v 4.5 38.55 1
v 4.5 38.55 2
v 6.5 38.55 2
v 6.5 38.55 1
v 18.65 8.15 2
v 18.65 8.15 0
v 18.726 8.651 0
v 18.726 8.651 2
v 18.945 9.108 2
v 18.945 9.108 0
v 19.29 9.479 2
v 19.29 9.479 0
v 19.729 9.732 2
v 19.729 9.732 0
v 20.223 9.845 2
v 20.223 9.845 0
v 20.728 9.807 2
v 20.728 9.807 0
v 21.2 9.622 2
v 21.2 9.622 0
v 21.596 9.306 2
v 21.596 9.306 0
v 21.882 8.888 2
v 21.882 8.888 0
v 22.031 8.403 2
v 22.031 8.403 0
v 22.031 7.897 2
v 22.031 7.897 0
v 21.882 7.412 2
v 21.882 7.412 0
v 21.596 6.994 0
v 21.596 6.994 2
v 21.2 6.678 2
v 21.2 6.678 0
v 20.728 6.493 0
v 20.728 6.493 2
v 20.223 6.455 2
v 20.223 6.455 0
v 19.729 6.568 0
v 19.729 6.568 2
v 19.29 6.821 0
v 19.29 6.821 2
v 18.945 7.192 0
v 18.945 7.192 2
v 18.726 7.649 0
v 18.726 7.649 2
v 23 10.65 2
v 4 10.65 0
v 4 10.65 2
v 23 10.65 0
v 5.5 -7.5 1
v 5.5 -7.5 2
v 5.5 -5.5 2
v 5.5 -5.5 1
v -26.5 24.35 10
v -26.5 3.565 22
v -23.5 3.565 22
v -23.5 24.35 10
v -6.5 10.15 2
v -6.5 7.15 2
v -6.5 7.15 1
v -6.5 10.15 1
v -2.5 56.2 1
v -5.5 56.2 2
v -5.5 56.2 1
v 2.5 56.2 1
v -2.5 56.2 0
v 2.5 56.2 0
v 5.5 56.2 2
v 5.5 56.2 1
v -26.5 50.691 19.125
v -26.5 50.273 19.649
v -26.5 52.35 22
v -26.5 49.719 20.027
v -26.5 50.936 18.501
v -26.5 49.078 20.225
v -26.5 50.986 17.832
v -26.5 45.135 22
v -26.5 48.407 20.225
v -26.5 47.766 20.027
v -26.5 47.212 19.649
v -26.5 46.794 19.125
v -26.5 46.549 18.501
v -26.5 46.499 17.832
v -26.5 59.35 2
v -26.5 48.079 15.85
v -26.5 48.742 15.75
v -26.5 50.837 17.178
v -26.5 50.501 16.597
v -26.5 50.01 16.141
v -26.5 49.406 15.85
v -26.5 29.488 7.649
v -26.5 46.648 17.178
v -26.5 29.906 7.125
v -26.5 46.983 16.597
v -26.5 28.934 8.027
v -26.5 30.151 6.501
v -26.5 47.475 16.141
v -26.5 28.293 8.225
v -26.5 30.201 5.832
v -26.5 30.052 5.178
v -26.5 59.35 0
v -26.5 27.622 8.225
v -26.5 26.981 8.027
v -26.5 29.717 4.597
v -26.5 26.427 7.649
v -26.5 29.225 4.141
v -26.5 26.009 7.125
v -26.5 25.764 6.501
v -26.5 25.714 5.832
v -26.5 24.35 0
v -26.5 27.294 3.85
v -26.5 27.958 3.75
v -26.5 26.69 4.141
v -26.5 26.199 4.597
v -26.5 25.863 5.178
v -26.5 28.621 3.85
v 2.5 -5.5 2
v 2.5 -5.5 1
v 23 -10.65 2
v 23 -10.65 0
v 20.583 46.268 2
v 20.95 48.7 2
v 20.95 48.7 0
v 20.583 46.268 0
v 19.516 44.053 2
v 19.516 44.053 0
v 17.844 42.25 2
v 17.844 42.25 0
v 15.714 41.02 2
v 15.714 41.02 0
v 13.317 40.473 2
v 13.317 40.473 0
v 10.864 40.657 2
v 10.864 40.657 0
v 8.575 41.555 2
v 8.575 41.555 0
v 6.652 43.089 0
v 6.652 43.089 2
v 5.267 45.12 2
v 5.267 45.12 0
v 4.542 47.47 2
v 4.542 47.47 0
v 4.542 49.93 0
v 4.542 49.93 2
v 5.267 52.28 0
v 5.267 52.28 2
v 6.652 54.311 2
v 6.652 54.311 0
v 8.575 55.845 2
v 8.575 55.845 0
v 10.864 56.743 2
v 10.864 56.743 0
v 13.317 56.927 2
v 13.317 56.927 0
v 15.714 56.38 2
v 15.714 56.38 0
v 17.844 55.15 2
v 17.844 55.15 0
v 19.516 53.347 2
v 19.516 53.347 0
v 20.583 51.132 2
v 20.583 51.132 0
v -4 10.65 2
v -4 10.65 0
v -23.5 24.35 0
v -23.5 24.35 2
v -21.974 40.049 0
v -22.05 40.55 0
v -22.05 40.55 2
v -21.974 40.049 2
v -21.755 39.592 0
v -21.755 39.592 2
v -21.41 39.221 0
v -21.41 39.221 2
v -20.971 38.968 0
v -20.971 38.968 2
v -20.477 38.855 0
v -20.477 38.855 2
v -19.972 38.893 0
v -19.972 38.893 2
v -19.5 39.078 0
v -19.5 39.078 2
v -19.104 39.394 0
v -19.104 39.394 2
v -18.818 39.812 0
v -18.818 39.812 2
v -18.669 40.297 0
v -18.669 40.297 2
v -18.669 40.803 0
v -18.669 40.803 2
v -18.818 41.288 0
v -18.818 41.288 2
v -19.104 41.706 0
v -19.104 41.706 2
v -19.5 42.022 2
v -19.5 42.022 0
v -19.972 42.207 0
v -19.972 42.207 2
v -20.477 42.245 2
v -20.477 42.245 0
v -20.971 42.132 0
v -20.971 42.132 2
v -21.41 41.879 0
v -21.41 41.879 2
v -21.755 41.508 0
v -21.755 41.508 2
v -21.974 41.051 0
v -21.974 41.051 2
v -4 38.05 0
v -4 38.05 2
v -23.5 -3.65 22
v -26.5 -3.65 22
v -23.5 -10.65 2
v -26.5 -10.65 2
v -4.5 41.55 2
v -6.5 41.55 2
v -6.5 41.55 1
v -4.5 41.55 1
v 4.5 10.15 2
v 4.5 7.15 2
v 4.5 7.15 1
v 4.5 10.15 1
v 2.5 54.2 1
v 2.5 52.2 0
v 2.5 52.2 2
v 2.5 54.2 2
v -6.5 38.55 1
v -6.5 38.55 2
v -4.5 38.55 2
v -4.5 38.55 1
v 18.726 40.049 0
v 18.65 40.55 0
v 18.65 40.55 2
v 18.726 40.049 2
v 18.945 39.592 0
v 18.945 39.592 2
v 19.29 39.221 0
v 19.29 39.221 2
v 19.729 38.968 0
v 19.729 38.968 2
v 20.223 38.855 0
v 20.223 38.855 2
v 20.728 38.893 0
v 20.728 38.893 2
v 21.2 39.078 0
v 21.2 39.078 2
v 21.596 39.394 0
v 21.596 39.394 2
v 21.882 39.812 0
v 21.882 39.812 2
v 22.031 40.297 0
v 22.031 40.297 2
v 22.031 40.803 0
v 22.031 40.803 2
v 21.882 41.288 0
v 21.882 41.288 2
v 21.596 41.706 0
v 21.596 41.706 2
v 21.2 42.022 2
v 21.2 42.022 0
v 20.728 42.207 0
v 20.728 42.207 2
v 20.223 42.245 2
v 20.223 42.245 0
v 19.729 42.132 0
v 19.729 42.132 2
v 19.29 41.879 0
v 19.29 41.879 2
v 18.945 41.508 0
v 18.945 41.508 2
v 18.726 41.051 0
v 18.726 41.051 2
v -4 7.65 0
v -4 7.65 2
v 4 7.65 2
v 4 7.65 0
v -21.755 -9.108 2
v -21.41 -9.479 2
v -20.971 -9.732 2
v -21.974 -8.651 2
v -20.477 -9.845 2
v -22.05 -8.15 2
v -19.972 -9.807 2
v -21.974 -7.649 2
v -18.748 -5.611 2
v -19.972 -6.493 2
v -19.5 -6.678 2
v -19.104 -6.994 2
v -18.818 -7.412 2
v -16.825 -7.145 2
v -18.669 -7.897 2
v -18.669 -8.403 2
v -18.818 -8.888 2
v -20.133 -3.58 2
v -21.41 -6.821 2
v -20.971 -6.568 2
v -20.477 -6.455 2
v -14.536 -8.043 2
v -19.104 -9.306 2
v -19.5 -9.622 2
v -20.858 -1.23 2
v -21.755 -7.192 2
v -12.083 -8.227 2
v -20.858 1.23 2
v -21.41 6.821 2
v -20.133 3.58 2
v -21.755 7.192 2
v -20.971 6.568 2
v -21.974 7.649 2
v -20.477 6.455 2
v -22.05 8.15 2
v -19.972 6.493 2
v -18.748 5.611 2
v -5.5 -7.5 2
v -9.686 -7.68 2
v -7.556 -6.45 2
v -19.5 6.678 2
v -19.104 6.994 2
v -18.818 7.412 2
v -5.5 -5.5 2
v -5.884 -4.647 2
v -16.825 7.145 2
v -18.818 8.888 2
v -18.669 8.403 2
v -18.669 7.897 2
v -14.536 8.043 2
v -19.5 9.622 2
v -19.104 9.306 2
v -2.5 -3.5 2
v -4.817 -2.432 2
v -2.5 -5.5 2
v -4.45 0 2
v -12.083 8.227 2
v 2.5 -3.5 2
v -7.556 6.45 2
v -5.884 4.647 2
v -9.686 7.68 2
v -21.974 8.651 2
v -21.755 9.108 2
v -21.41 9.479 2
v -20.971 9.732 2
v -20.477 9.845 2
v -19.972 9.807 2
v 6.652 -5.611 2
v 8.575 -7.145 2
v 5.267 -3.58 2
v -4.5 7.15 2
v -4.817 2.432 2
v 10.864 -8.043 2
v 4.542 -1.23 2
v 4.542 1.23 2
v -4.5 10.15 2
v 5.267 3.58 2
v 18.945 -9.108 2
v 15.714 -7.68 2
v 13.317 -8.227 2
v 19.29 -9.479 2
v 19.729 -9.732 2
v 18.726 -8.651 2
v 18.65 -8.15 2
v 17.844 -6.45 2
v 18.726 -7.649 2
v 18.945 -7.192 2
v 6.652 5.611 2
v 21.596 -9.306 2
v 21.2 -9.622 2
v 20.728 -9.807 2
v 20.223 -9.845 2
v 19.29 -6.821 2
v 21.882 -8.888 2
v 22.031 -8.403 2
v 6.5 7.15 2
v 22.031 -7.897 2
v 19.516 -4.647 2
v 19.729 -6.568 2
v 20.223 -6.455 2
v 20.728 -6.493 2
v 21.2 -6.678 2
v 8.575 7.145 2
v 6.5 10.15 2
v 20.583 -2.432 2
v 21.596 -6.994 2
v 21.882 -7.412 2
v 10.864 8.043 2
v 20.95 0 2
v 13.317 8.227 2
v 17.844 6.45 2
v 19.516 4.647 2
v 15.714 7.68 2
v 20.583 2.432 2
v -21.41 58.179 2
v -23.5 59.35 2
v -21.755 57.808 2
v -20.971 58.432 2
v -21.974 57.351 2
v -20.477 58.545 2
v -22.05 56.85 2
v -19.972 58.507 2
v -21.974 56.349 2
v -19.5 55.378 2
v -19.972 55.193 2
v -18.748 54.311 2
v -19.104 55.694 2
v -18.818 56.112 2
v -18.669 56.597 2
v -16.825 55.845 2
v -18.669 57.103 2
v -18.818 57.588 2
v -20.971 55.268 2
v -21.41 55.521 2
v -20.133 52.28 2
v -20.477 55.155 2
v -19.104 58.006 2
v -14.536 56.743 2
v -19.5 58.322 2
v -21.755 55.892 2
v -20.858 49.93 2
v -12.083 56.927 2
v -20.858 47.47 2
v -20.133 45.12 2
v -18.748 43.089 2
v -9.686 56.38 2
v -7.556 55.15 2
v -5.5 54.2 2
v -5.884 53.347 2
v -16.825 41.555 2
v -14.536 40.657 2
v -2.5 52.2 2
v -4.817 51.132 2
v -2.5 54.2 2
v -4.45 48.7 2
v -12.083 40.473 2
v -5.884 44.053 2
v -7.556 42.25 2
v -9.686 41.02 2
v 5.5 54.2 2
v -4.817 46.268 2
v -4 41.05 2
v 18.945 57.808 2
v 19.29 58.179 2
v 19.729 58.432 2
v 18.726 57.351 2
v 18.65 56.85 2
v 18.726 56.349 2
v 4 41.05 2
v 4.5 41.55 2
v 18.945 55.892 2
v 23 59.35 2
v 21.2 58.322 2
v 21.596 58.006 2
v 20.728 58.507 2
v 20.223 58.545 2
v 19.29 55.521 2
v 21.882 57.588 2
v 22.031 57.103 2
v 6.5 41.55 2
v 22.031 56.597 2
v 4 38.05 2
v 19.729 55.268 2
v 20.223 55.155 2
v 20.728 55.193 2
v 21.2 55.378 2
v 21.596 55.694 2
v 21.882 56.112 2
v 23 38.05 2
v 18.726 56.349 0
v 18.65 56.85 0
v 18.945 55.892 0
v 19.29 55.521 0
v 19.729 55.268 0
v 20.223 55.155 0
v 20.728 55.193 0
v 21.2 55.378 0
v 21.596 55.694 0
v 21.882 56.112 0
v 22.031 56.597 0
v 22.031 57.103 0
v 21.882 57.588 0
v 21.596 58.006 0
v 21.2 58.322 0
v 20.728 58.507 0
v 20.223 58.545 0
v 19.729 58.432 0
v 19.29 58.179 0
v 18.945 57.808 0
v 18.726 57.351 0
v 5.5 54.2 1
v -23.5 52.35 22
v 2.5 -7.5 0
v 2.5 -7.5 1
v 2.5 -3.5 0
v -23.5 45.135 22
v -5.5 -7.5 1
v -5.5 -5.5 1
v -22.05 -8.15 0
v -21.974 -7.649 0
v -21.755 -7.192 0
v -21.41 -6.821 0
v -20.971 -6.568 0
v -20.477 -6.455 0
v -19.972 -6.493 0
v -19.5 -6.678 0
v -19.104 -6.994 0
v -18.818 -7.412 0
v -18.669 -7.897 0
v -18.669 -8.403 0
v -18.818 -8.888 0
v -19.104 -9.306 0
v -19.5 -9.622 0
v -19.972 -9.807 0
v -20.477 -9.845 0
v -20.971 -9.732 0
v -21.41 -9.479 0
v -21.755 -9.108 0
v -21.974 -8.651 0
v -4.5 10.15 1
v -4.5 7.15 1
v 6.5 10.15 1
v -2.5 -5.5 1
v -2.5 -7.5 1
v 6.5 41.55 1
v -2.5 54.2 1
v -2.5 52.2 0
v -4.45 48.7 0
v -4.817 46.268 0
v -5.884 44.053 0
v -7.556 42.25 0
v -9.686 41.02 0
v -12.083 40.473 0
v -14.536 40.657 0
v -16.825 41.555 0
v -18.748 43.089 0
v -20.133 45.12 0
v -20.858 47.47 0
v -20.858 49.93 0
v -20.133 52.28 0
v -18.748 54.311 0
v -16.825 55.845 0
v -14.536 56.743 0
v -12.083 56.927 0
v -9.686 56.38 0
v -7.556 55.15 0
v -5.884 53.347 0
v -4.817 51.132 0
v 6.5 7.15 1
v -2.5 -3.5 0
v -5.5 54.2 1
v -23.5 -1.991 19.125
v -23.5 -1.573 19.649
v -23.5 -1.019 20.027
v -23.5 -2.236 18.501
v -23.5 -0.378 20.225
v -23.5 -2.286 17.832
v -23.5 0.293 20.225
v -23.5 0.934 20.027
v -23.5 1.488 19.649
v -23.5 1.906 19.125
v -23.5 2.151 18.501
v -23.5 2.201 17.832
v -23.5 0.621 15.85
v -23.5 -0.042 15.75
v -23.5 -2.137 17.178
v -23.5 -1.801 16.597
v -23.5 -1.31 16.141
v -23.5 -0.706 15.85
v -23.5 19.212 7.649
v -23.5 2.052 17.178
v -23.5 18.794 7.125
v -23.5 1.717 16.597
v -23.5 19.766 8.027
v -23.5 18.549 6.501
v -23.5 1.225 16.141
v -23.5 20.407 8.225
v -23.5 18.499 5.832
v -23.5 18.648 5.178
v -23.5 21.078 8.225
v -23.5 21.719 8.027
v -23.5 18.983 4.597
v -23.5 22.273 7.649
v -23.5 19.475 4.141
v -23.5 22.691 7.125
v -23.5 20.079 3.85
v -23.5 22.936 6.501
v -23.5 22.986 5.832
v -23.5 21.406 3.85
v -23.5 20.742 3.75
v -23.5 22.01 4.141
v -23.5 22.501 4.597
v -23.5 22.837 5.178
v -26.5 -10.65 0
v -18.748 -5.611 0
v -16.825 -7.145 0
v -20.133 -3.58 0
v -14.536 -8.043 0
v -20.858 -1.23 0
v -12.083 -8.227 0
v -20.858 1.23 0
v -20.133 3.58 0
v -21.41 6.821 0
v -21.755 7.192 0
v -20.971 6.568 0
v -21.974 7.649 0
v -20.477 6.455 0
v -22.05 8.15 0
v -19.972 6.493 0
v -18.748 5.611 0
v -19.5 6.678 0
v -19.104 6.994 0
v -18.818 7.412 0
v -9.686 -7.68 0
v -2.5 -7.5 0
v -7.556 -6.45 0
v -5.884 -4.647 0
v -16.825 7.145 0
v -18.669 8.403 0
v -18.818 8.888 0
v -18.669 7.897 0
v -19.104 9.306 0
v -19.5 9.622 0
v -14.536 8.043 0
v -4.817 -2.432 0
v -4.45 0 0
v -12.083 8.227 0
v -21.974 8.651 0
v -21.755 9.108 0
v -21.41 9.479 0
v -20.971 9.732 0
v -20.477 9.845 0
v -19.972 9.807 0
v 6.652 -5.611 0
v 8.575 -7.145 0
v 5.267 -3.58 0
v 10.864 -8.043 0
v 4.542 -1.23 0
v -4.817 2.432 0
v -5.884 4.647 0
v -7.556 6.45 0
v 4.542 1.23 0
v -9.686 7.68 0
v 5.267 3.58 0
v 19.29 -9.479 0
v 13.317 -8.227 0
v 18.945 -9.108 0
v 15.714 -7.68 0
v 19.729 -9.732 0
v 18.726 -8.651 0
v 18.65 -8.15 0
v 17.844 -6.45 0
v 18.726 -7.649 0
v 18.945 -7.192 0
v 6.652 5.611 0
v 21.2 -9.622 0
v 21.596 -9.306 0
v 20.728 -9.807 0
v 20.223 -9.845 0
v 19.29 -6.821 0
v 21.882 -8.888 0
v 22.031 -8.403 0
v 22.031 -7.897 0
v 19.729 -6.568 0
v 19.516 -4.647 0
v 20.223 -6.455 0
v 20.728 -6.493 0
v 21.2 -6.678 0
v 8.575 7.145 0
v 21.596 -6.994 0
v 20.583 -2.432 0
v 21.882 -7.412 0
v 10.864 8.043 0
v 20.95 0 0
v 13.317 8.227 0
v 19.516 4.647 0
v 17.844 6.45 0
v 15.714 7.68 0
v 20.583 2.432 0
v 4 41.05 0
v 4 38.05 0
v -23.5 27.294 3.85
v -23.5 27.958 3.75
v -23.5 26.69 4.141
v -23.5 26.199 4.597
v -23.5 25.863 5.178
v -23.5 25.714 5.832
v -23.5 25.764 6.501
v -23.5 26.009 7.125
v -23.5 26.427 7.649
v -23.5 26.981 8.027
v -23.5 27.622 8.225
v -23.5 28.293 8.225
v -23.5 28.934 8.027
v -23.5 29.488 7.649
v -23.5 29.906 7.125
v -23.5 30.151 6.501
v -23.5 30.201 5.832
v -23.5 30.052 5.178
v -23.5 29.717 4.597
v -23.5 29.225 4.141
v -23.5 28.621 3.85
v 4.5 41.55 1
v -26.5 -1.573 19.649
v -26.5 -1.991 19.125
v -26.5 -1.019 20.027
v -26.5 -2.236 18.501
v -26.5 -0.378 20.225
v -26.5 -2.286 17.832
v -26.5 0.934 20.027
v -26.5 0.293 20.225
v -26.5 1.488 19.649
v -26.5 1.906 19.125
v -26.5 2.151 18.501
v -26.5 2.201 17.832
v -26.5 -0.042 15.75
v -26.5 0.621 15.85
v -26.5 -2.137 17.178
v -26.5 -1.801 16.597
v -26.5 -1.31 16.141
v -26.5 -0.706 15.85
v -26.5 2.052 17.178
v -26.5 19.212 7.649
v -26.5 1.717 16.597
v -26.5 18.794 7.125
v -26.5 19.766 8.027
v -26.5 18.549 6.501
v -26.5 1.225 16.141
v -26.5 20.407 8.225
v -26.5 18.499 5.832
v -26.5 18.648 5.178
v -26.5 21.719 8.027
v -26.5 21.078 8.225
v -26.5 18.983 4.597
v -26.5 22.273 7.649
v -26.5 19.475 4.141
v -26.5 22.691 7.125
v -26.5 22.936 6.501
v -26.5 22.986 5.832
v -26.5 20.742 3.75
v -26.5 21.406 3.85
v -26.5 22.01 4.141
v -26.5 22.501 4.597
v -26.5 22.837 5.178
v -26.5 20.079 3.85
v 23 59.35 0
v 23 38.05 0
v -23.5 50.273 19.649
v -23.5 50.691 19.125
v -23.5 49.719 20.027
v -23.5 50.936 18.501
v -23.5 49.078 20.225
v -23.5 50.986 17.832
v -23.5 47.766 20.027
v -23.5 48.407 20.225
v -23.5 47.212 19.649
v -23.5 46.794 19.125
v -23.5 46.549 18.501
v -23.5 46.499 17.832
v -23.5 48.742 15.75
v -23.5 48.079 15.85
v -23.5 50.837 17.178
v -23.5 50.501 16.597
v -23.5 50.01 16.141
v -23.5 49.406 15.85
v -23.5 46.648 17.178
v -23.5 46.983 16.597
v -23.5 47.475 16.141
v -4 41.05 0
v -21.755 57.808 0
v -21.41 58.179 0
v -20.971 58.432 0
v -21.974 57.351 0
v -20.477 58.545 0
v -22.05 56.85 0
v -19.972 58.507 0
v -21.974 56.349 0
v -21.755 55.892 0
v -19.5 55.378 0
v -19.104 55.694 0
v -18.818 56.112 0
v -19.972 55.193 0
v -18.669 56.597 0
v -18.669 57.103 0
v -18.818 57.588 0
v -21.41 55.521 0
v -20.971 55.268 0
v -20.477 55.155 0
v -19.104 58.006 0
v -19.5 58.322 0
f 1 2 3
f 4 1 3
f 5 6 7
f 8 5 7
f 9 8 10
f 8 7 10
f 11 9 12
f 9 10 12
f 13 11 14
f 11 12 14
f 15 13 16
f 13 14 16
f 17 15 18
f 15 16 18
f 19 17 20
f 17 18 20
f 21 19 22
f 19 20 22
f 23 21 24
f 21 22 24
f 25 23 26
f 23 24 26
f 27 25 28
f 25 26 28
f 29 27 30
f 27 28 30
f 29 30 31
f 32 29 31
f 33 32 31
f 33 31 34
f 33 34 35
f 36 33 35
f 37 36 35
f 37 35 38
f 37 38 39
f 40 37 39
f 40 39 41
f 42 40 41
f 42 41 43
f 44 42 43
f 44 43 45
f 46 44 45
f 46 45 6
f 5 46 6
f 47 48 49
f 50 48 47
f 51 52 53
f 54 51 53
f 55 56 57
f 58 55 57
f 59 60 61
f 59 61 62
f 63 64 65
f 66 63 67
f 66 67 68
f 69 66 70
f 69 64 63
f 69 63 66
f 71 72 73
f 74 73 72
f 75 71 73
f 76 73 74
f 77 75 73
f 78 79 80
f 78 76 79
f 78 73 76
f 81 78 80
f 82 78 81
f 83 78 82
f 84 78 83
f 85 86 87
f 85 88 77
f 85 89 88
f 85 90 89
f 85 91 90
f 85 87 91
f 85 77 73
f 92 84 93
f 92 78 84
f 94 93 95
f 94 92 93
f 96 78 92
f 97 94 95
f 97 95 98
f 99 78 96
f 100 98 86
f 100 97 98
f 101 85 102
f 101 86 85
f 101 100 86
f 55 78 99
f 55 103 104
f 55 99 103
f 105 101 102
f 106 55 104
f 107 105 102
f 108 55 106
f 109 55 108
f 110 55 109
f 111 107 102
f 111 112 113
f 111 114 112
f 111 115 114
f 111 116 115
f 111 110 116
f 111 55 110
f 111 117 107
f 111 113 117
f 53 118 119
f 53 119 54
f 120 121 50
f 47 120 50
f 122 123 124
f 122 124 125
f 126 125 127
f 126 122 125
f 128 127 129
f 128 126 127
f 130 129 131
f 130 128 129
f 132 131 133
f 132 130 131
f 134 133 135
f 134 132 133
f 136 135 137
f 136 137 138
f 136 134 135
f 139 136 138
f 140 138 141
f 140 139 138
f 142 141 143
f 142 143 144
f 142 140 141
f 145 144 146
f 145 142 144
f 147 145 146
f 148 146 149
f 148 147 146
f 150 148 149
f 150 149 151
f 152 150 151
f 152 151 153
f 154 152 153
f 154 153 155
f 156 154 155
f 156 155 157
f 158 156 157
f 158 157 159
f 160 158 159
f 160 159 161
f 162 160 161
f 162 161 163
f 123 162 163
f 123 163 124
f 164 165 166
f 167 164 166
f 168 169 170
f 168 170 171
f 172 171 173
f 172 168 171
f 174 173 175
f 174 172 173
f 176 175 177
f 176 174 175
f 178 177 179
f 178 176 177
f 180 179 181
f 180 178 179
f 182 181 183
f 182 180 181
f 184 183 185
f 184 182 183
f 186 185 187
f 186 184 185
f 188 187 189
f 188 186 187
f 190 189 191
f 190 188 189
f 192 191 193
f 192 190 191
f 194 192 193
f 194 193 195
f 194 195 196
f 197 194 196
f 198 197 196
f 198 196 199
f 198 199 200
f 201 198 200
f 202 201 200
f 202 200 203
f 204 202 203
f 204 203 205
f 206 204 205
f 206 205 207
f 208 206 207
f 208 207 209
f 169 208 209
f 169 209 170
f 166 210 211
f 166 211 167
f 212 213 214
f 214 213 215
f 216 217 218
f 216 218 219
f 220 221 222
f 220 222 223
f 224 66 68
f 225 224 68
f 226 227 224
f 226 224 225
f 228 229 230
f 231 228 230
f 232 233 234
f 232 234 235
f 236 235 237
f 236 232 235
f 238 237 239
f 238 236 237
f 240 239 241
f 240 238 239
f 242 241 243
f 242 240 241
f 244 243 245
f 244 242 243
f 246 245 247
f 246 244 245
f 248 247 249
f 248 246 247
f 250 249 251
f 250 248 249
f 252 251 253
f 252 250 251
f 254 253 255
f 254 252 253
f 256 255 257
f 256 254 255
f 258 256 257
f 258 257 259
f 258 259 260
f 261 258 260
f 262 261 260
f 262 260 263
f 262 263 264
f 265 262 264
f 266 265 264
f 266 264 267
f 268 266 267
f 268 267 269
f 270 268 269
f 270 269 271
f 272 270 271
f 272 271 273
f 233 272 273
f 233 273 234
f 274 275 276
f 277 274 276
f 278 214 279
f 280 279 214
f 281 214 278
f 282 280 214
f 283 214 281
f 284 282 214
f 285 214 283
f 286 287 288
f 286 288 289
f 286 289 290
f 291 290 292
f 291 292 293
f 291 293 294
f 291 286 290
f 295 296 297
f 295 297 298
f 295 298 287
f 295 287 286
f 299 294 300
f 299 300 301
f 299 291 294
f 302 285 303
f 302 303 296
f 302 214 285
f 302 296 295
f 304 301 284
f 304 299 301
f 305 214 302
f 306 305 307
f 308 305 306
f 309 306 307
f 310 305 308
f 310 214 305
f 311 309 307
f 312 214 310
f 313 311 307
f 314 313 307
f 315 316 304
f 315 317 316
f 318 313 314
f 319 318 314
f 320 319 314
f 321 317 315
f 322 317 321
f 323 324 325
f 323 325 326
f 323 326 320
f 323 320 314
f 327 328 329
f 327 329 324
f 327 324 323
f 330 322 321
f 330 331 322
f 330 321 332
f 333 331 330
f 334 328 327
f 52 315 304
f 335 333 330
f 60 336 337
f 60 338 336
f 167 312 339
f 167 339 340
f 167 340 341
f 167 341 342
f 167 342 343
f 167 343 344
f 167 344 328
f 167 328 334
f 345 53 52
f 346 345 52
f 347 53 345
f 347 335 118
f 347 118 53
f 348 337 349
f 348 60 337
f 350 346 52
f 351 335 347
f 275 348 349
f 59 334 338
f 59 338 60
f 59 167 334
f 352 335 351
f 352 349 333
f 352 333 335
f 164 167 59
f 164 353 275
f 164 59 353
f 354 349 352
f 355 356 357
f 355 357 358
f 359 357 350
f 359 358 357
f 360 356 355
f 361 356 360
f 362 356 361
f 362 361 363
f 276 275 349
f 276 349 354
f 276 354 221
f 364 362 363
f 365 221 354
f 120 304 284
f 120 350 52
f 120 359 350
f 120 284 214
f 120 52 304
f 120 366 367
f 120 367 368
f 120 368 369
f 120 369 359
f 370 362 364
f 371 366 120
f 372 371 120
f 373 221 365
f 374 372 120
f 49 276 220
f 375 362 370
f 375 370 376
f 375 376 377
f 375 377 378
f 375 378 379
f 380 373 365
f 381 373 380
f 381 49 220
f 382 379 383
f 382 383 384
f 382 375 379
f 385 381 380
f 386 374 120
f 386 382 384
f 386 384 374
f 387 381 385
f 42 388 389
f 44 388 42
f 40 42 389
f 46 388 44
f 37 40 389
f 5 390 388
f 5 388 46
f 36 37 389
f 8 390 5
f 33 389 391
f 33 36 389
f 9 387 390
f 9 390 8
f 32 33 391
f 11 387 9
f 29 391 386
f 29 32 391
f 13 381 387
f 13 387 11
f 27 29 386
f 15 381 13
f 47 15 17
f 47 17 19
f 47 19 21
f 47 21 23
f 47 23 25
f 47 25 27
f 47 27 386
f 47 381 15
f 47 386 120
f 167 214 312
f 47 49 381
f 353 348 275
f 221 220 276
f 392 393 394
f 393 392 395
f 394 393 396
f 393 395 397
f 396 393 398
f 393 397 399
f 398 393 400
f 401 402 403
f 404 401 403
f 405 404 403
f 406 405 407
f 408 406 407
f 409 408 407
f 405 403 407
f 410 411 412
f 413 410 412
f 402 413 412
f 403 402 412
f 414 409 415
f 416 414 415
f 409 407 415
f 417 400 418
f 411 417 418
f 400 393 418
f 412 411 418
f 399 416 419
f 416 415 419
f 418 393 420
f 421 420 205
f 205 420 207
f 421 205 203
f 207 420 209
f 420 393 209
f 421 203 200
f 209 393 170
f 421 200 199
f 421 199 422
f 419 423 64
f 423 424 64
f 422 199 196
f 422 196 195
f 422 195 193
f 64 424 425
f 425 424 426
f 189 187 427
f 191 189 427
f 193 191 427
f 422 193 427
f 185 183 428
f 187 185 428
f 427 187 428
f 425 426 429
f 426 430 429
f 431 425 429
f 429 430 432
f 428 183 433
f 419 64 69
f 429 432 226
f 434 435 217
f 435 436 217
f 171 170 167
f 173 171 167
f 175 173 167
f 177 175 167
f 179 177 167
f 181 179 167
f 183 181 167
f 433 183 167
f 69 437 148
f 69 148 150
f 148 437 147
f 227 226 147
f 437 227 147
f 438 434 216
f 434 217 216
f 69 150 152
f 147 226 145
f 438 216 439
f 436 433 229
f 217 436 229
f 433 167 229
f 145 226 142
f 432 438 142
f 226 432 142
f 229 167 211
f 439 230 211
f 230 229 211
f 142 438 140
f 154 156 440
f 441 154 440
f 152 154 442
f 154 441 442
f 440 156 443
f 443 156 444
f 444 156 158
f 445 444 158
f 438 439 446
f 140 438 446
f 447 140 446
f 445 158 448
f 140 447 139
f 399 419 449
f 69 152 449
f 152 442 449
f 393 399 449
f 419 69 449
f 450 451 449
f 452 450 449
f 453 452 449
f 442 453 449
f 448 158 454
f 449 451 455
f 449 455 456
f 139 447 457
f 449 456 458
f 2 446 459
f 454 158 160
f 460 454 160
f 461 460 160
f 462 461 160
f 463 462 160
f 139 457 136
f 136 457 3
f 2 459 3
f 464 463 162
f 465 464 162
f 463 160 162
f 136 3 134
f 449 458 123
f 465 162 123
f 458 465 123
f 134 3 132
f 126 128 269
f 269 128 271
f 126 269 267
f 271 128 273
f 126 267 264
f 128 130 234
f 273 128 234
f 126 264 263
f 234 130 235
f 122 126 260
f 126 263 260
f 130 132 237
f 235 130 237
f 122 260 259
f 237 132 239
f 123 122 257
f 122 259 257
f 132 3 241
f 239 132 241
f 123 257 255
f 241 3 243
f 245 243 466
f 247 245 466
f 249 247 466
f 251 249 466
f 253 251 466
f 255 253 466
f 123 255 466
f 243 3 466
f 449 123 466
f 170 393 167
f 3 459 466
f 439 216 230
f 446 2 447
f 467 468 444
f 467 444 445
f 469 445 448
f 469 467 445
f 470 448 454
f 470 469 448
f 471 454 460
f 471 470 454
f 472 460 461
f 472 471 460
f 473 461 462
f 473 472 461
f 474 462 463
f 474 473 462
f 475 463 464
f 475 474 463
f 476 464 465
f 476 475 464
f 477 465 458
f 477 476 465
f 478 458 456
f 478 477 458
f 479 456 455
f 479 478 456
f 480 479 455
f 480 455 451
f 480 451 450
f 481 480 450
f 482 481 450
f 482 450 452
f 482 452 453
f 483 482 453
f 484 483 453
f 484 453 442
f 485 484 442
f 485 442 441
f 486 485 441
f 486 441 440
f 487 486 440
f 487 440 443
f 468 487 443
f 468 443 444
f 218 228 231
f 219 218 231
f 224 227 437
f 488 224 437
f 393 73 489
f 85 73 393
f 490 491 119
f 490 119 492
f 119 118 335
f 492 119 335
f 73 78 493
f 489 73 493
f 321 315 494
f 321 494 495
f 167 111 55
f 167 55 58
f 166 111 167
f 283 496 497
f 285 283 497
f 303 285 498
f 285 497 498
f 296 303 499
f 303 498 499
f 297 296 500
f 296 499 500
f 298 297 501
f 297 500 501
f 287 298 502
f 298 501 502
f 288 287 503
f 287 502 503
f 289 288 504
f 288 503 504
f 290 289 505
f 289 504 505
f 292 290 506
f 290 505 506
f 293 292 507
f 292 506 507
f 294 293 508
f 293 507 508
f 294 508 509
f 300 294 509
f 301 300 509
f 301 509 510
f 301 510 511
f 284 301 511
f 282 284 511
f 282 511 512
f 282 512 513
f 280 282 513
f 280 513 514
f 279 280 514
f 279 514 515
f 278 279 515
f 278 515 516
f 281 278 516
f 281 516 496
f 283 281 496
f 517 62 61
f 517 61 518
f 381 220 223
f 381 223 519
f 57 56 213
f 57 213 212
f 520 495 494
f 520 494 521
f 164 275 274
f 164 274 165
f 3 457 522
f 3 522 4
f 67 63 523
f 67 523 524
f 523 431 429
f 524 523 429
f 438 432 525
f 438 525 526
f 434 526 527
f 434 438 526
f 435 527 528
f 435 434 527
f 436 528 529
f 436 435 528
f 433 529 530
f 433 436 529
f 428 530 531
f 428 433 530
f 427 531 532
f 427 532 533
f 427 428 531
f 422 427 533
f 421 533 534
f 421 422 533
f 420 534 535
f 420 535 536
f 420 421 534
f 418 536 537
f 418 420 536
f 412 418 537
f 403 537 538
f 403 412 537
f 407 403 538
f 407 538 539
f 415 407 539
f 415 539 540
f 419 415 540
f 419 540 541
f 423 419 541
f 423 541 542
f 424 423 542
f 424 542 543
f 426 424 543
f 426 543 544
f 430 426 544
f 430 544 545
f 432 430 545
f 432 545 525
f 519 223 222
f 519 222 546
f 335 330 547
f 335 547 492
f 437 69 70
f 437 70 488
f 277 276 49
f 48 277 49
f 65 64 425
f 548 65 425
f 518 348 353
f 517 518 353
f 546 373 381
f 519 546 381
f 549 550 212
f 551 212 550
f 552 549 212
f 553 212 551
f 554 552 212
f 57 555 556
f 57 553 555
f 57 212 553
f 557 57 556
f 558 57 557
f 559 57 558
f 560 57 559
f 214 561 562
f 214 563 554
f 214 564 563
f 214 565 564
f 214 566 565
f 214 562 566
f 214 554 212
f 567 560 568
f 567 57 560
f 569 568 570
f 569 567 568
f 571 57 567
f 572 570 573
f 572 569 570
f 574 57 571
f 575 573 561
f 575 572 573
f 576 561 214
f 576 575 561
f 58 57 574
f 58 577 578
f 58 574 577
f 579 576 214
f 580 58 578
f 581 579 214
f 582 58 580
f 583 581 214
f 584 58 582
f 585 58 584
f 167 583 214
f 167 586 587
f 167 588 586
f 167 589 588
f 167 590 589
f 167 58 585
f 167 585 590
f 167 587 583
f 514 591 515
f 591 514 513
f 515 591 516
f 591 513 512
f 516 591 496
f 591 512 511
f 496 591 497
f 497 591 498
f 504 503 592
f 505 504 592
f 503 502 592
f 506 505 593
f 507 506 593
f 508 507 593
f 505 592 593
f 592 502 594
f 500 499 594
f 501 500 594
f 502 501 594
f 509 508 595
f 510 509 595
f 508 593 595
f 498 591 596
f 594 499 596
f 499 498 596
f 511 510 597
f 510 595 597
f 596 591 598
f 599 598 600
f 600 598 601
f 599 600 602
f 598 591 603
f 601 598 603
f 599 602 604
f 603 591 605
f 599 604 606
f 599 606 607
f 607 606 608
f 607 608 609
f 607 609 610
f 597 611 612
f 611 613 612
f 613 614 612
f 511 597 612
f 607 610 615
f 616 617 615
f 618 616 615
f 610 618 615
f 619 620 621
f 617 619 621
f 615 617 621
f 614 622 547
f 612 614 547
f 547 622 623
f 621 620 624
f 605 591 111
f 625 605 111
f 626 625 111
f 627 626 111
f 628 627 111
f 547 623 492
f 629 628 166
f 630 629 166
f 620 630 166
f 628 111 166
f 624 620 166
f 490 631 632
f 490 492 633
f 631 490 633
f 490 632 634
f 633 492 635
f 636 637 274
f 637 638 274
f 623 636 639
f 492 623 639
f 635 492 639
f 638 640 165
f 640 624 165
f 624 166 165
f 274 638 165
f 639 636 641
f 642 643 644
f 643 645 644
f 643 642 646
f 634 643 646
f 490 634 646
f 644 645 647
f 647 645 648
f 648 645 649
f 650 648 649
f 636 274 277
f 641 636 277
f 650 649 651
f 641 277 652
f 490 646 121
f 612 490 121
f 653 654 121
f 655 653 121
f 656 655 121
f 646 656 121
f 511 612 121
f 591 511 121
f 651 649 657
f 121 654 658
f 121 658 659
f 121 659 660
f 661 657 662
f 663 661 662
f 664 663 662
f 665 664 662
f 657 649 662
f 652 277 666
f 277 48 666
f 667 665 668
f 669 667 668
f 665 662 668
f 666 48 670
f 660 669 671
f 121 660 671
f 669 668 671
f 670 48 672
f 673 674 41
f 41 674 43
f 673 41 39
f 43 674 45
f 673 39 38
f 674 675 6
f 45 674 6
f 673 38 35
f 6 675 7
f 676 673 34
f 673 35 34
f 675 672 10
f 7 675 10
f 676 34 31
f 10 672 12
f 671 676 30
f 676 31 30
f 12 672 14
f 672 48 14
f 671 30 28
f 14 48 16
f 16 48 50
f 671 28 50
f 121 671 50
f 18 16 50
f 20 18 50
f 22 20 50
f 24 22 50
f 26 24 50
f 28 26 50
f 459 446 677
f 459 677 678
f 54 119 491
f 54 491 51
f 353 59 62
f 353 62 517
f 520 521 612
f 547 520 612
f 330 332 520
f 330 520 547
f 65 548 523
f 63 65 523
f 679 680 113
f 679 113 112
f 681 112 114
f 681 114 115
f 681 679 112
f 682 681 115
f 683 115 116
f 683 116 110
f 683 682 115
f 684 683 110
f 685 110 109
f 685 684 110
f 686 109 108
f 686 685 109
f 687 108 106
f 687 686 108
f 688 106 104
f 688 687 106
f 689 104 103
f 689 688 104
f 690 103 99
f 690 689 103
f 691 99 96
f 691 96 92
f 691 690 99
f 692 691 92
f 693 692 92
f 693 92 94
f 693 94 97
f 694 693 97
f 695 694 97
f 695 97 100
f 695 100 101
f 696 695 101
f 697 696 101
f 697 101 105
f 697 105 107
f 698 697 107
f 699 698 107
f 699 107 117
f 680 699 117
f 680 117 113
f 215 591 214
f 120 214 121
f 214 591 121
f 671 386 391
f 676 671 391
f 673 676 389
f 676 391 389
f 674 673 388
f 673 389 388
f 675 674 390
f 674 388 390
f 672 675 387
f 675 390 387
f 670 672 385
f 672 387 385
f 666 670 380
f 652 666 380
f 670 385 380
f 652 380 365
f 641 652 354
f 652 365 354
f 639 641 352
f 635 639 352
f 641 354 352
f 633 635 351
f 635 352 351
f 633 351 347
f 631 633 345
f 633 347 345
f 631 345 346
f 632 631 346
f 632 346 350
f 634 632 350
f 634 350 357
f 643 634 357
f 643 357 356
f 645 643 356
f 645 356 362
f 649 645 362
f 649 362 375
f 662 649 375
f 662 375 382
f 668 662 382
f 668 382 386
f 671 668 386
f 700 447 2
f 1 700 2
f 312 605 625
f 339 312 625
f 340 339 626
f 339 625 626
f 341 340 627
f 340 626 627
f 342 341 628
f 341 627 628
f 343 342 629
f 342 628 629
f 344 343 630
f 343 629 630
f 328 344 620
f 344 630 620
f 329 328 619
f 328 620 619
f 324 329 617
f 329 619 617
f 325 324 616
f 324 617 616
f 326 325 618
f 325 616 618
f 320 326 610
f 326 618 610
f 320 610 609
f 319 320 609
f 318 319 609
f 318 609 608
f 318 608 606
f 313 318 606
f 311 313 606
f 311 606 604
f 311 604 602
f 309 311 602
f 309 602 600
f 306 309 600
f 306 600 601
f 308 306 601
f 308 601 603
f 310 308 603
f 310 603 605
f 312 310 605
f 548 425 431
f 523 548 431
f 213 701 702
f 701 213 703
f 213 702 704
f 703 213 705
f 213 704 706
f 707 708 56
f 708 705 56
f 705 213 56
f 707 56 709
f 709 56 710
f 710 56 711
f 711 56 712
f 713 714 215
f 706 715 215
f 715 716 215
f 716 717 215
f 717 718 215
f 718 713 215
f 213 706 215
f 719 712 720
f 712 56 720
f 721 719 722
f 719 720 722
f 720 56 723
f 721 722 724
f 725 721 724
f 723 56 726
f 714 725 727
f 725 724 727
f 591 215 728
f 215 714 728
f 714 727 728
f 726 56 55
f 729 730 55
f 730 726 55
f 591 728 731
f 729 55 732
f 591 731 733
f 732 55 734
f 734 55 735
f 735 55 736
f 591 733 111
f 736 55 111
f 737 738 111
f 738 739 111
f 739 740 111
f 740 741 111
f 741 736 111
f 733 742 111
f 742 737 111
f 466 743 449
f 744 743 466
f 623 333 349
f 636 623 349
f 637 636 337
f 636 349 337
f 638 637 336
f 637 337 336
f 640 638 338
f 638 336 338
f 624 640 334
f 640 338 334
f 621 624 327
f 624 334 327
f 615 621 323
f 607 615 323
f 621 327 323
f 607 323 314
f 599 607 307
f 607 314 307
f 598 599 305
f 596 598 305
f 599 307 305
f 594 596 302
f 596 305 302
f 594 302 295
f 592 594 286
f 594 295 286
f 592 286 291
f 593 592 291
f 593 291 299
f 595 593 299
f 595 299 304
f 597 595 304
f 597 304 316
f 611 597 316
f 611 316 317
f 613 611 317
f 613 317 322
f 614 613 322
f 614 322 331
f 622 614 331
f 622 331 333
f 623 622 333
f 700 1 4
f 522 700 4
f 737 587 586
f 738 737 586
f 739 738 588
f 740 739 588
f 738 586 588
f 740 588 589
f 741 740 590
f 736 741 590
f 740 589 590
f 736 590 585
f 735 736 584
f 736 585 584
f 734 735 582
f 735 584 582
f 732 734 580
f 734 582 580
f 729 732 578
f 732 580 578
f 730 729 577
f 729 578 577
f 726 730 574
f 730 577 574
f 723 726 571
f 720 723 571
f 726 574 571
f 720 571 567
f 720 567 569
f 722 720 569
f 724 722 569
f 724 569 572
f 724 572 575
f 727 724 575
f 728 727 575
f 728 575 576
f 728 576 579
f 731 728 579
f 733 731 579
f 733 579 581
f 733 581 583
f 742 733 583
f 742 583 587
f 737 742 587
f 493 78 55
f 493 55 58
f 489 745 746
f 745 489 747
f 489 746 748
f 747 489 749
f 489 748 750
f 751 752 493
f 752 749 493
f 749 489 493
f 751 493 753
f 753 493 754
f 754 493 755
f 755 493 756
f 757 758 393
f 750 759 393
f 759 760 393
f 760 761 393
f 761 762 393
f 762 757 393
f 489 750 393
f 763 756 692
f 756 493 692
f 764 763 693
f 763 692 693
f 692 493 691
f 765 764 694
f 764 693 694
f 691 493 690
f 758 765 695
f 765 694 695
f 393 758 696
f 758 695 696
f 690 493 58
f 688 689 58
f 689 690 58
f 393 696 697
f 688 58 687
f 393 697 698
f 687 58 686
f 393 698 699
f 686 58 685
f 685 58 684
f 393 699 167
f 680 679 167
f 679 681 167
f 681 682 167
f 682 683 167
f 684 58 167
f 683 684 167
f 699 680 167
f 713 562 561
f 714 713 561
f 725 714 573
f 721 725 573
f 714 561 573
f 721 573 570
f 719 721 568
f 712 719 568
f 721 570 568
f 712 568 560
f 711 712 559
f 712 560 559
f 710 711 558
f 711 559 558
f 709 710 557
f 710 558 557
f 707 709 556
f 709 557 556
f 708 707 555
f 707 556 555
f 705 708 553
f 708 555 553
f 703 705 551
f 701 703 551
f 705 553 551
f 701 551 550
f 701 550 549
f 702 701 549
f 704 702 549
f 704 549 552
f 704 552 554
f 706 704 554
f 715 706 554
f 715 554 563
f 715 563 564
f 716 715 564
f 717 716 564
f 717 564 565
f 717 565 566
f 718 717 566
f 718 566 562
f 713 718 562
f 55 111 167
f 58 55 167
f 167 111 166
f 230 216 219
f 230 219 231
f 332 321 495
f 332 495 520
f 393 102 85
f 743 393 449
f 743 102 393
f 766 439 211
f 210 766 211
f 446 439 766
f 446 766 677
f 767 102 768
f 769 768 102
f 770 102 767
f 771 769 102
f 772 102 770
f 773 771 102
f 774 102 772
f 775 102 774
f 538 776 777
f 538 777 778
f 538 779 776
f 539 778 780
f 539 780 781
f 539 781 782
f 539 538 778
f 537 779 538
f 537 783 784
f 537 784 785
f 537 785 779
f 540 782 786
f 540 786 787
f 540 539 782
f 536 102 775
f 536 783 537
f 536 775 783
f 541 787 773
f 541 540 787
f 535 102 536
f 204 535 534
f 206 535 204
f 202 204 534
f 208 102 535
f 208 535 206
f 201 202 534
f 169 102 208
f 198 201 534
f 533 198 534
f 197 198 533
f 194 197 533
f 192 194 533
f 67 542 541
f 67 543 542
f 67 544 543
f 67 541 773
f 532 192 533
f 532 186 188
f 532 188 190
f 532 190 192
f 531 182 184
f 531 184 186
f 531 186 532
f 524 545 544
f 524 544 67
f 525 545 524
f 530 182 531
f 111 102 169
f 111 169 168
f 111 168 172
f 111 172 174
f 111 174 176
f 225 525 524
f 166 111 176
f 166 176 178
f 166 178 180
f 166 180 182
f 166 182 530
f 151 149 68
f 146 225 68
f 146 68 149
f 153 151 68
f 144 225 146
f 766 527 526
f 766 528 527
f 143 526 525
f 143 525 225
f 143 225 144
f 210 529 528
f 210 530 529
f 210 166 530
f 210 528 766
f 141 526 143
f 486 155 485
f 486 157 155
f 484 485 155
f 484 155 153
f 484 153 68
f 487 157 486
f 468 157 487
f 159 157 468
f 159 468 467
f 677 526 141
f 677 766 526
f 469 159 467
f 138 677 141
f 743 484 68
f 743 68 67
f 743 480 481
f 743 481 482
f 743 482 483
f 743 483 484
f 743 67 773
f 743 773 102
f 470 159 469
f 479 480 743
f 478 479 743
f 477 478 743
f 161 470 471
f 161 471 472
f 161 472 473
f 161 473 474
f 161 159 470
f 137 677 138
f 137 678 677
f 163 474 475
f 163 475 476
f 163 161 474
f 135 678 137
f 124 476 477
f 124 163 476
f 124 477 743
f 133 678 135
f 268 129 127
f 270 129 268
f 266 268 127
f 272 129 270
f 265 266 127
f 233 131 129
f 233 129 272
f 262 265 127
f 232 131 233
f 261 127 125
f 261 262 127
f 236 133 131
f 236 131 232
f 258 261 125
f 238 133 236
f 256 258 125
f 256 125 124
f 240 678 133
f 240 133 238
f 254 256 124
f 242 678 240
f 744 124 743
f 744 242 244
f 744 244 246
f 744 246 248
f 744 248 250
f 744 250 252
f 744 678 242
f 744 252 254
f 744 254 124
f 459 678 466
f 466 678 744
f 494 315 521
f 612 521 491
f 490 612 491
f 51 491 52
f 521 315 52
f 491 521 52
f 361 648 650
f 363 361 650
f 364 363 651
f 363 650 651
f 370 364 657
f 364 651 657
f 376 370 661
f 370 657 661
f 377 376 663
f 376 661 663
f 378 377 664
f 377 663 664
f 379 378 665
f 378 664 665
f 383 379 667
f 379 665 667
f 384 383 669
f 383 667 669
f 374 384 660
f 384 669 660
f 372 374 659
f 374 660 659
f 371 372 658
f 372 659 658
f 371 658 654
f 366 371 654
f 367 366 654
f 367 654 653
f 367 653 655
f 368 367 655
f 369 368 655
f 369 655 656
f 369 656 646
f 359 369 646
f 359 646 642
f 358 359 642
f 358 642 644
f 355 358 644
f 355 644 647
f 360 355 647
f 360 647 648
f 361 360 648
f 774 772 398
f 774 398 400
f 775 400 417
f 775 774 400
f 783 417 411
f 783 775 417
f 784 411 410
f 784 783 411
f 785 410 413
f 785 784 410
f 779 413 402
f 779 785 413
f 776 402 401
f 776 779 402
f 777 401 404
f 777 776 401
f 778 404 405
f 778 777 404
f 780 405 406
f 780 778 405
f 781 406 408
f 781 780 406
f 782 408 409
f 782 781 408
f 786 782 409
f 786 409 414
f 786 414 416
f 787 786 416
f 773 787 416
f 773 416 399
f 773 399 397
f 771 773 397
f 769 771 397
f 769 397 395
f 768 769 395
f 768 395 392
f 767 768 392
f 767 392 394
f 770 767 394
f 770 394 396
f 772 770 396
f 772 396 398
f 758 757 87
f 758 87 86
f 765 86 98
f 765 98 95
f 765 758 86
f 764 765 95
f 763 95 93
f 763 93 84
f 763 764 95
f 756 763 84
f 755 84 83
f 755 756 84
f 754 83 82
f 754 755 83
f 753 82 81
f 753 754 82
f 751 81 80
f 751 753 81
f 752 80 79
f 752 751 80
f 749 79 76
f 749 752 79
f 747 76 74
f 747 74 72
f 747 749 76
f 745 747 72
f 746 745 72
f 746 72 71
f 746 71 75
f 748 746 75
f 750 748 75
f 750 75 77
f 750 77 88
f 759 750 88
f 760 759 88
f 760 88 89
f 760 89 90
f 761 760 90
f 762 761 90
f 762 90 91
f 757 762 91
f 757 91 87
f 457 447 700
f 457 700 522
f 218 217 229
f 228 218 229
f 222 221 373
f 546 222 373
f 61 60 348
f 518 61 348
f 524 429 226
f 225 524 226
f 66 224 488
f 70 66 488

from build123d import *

# Parameters (mm, degrees)
SKETCH_1_W          = 46
SKETCH_1_H          = 21.3
EXTRUDE_1_DEPTH     = 2
SKETCH_2_R          = 8.25
CUT_EXTRUDE_1_DEPTH = 3
SKETCH_3_W          = 8
SKETCH_3_H          = 3
CUT_EXTRUDE_2_DEPTH = 3
SKETCH_4_W          = 5
SKETCH_4_H          = 4
CUT_EXTRUDE_3_DEPTH = 3
SKETCH_5_W          = 3
SKETCH_5_H          = 2
SKETCH_5_W_2        = 2
SKETCH_5_H_2        = 3
CUT_EXTRUDE_4_DEPTH = 1
HOLE_WIZARD_M3_1_D  = 3.4
SKETCH_11_W         = 2
SKETCH_11_H         = 21.3
EXTRUDE_4_DEPTH     = 0.5
SKETCH_12_W         = 3
SKETCH_12_H         = 35
EXTRUDE_5_DEPTH     = 2
SKETCH_17_W         = 3
SKETCH_17_H         = 28
EXTRUDE_8_DEPTH     = 20
HOLE_WIZARD_M4_2_D  = 4.5
EXTRUDE_9_DEPTH     = 3
CHAMFER_1_SIZE      = 12
CHAMFER_1_SIZE2     = 20.784609691
EXTRUDE_10_DEPTH    = 2


with BuildPart() as part:
    # 草圖1 → 填料-伸長1 (new body)
    with BuildSketch(Plane.XY):
        Rectangle(SKETCH_1_W, SKETCH_1_H)
    extrude(amount=EXTRUDE_1_DEPTH)

    # 草圖2 → 除料-伸長1 (cut, through all)
    with BuildSketch(Plane.XY.offset(2)):
        with Locations((-12.7, 0)):
            Circle(SKETCH_2_R)
        with Locations((12.7, 0)):
            Circle(SKETCH_2_R)
    extrude(amount=-CUT_EXTRUDE_1_DEPTH, mode=Mode.SUBTRACT)

    # 草圖3 → 除料-伸長2 (cut, through all)
    with BuildSketch(Plane.XY.offset(2)):
        with Locations((0, 9.15)):
            Rectangle(SKETCH_3_W, SKETCH_3_H)
    extrude(amount=-CUT_EXTRUDE_2_DEPTH, mode=Mode.SUBTRACT)

    # 草圖4 → 除料-伸長3 (cut, through all)
    with BuildSketch(Plane.XY.offset(2)):
        with Locations((0, -5.5)):
            Rectangle(SKETCH_4_W, SKETCH_4_H)
    extrude(amount=-CUT_EXTRUDE_3_DEPTH, mode=Mode.SUBTRACT)

    # 草圖5 → 除料-伸長4 (cut)
    with BuildSketch(Plane.XY.offset(2)):
        with Locations((4, -6.5)):
            Rectangle(SKETCH_5_W, SKETCH_5_H)
        with Locations((-5.5, 8.65)):
            Rectangle(SKETCH_5_W_2, SKETCH_5_H_2)
        with Locations((5.5, 8.65)):
            Rectangle(SKETCH_5_W_2, SKETCH_5_H_2)
        with Locations((-4, -6.5)):
            Rectangle(SKETCH_5_W, SKETCH_5_H)
    extrude(amount=-CUT_EXTRUDE_4_DEPTH, mode=Mode.SUBTRACT)

    # M3 餘隙孔1 (through all)
    with Locations(Plane.XY.offset(2)):
        with Locations((20.35, 8.15), (-20.35, -8.15), (-20.35, 8.15), (20.35, -8.15)):
            Hole(HOLE_WIZARD_M3_1_D / 2)

    # 草圖11 → 填料-伸長4 (add)
    with BuildSketch(Plane.ZY.offset(23)):
        with Locations((1, 0)):
            Rectangle(SKETCH_11_W, SKETCH_11_H)
    extrude(amount=EXTRUDE_4_DEPTH)

    # 草圖12 → 填料-伸長5 (add)
    with BuildSketch(Plane.XY):
        with Locations((-25, 6.85)):
            Rectangle(SKETCH_12_W, SKETCH_12_H)
    extrude(amount=EXTRUDE_5_DEPTH)

    # 草圖17 → 填料-伸長8 (add)
    with BuildSketch(Plane.XY.offset(2)):
        with Locations((-25, 10.35)):
            Rectangle(SKETCH_17_W, SKETCH_17_H)
    extrude(amount=EXTRUDE_8_DEPTH)

    # M4 餘隙孔2 (through all)
    with Locations(Plane.ZY.offset(26.5)):
        with Locations((6, 20.742304845), (18, -0.042304845)):
            Hole(HOLE_WIZARD_M4_2_D / 2)

    # 草圖22 → 填料-伸長9 (add)
    with BuildSketch(Plane.ZY.offset(26.5)):
        Polygon((22, -3.65), (2, -10.65), (2, -3.65), align=None)
    extrude(amount=-EXTRUDE_9_DEPTH)

    # 導角1
    chamfer_1_edges = [part.edges().sort_by_distance(p)[0] for p in [
        (-25, 24.35, 22),
    ]]
    chamfer_1_side = [part.faces().sort_by_distance(p)[0] for p in [
        (-25, 24.35, 11),
    ]]
    chamfer(chamfer_1_edges, length=CHAMFER_1_SIZE, length2=CHAMFER_1_SIZE2, reference=chamfer_1_side[0])

    # 草圖23 → 填料-伸長10 (add)
    with BuildSketch(Plane(origin=(0, 0, 0), x_dir=(-1, 0, 0), z_dir=(0, 0, -1))):
        Polygon((4, 10.65), (23.5, 24.35), (23.5, 10.65), align=None)
    extrude(amount=-EXTRUDE_10_DEPTH)


with BuildPart() as body_2:
    # 鏡射1: mirrored copy
    add(part.part.mirror(Plane.ZX.offset(24.35)))


solid = Compound([part.part, body_2.part])
